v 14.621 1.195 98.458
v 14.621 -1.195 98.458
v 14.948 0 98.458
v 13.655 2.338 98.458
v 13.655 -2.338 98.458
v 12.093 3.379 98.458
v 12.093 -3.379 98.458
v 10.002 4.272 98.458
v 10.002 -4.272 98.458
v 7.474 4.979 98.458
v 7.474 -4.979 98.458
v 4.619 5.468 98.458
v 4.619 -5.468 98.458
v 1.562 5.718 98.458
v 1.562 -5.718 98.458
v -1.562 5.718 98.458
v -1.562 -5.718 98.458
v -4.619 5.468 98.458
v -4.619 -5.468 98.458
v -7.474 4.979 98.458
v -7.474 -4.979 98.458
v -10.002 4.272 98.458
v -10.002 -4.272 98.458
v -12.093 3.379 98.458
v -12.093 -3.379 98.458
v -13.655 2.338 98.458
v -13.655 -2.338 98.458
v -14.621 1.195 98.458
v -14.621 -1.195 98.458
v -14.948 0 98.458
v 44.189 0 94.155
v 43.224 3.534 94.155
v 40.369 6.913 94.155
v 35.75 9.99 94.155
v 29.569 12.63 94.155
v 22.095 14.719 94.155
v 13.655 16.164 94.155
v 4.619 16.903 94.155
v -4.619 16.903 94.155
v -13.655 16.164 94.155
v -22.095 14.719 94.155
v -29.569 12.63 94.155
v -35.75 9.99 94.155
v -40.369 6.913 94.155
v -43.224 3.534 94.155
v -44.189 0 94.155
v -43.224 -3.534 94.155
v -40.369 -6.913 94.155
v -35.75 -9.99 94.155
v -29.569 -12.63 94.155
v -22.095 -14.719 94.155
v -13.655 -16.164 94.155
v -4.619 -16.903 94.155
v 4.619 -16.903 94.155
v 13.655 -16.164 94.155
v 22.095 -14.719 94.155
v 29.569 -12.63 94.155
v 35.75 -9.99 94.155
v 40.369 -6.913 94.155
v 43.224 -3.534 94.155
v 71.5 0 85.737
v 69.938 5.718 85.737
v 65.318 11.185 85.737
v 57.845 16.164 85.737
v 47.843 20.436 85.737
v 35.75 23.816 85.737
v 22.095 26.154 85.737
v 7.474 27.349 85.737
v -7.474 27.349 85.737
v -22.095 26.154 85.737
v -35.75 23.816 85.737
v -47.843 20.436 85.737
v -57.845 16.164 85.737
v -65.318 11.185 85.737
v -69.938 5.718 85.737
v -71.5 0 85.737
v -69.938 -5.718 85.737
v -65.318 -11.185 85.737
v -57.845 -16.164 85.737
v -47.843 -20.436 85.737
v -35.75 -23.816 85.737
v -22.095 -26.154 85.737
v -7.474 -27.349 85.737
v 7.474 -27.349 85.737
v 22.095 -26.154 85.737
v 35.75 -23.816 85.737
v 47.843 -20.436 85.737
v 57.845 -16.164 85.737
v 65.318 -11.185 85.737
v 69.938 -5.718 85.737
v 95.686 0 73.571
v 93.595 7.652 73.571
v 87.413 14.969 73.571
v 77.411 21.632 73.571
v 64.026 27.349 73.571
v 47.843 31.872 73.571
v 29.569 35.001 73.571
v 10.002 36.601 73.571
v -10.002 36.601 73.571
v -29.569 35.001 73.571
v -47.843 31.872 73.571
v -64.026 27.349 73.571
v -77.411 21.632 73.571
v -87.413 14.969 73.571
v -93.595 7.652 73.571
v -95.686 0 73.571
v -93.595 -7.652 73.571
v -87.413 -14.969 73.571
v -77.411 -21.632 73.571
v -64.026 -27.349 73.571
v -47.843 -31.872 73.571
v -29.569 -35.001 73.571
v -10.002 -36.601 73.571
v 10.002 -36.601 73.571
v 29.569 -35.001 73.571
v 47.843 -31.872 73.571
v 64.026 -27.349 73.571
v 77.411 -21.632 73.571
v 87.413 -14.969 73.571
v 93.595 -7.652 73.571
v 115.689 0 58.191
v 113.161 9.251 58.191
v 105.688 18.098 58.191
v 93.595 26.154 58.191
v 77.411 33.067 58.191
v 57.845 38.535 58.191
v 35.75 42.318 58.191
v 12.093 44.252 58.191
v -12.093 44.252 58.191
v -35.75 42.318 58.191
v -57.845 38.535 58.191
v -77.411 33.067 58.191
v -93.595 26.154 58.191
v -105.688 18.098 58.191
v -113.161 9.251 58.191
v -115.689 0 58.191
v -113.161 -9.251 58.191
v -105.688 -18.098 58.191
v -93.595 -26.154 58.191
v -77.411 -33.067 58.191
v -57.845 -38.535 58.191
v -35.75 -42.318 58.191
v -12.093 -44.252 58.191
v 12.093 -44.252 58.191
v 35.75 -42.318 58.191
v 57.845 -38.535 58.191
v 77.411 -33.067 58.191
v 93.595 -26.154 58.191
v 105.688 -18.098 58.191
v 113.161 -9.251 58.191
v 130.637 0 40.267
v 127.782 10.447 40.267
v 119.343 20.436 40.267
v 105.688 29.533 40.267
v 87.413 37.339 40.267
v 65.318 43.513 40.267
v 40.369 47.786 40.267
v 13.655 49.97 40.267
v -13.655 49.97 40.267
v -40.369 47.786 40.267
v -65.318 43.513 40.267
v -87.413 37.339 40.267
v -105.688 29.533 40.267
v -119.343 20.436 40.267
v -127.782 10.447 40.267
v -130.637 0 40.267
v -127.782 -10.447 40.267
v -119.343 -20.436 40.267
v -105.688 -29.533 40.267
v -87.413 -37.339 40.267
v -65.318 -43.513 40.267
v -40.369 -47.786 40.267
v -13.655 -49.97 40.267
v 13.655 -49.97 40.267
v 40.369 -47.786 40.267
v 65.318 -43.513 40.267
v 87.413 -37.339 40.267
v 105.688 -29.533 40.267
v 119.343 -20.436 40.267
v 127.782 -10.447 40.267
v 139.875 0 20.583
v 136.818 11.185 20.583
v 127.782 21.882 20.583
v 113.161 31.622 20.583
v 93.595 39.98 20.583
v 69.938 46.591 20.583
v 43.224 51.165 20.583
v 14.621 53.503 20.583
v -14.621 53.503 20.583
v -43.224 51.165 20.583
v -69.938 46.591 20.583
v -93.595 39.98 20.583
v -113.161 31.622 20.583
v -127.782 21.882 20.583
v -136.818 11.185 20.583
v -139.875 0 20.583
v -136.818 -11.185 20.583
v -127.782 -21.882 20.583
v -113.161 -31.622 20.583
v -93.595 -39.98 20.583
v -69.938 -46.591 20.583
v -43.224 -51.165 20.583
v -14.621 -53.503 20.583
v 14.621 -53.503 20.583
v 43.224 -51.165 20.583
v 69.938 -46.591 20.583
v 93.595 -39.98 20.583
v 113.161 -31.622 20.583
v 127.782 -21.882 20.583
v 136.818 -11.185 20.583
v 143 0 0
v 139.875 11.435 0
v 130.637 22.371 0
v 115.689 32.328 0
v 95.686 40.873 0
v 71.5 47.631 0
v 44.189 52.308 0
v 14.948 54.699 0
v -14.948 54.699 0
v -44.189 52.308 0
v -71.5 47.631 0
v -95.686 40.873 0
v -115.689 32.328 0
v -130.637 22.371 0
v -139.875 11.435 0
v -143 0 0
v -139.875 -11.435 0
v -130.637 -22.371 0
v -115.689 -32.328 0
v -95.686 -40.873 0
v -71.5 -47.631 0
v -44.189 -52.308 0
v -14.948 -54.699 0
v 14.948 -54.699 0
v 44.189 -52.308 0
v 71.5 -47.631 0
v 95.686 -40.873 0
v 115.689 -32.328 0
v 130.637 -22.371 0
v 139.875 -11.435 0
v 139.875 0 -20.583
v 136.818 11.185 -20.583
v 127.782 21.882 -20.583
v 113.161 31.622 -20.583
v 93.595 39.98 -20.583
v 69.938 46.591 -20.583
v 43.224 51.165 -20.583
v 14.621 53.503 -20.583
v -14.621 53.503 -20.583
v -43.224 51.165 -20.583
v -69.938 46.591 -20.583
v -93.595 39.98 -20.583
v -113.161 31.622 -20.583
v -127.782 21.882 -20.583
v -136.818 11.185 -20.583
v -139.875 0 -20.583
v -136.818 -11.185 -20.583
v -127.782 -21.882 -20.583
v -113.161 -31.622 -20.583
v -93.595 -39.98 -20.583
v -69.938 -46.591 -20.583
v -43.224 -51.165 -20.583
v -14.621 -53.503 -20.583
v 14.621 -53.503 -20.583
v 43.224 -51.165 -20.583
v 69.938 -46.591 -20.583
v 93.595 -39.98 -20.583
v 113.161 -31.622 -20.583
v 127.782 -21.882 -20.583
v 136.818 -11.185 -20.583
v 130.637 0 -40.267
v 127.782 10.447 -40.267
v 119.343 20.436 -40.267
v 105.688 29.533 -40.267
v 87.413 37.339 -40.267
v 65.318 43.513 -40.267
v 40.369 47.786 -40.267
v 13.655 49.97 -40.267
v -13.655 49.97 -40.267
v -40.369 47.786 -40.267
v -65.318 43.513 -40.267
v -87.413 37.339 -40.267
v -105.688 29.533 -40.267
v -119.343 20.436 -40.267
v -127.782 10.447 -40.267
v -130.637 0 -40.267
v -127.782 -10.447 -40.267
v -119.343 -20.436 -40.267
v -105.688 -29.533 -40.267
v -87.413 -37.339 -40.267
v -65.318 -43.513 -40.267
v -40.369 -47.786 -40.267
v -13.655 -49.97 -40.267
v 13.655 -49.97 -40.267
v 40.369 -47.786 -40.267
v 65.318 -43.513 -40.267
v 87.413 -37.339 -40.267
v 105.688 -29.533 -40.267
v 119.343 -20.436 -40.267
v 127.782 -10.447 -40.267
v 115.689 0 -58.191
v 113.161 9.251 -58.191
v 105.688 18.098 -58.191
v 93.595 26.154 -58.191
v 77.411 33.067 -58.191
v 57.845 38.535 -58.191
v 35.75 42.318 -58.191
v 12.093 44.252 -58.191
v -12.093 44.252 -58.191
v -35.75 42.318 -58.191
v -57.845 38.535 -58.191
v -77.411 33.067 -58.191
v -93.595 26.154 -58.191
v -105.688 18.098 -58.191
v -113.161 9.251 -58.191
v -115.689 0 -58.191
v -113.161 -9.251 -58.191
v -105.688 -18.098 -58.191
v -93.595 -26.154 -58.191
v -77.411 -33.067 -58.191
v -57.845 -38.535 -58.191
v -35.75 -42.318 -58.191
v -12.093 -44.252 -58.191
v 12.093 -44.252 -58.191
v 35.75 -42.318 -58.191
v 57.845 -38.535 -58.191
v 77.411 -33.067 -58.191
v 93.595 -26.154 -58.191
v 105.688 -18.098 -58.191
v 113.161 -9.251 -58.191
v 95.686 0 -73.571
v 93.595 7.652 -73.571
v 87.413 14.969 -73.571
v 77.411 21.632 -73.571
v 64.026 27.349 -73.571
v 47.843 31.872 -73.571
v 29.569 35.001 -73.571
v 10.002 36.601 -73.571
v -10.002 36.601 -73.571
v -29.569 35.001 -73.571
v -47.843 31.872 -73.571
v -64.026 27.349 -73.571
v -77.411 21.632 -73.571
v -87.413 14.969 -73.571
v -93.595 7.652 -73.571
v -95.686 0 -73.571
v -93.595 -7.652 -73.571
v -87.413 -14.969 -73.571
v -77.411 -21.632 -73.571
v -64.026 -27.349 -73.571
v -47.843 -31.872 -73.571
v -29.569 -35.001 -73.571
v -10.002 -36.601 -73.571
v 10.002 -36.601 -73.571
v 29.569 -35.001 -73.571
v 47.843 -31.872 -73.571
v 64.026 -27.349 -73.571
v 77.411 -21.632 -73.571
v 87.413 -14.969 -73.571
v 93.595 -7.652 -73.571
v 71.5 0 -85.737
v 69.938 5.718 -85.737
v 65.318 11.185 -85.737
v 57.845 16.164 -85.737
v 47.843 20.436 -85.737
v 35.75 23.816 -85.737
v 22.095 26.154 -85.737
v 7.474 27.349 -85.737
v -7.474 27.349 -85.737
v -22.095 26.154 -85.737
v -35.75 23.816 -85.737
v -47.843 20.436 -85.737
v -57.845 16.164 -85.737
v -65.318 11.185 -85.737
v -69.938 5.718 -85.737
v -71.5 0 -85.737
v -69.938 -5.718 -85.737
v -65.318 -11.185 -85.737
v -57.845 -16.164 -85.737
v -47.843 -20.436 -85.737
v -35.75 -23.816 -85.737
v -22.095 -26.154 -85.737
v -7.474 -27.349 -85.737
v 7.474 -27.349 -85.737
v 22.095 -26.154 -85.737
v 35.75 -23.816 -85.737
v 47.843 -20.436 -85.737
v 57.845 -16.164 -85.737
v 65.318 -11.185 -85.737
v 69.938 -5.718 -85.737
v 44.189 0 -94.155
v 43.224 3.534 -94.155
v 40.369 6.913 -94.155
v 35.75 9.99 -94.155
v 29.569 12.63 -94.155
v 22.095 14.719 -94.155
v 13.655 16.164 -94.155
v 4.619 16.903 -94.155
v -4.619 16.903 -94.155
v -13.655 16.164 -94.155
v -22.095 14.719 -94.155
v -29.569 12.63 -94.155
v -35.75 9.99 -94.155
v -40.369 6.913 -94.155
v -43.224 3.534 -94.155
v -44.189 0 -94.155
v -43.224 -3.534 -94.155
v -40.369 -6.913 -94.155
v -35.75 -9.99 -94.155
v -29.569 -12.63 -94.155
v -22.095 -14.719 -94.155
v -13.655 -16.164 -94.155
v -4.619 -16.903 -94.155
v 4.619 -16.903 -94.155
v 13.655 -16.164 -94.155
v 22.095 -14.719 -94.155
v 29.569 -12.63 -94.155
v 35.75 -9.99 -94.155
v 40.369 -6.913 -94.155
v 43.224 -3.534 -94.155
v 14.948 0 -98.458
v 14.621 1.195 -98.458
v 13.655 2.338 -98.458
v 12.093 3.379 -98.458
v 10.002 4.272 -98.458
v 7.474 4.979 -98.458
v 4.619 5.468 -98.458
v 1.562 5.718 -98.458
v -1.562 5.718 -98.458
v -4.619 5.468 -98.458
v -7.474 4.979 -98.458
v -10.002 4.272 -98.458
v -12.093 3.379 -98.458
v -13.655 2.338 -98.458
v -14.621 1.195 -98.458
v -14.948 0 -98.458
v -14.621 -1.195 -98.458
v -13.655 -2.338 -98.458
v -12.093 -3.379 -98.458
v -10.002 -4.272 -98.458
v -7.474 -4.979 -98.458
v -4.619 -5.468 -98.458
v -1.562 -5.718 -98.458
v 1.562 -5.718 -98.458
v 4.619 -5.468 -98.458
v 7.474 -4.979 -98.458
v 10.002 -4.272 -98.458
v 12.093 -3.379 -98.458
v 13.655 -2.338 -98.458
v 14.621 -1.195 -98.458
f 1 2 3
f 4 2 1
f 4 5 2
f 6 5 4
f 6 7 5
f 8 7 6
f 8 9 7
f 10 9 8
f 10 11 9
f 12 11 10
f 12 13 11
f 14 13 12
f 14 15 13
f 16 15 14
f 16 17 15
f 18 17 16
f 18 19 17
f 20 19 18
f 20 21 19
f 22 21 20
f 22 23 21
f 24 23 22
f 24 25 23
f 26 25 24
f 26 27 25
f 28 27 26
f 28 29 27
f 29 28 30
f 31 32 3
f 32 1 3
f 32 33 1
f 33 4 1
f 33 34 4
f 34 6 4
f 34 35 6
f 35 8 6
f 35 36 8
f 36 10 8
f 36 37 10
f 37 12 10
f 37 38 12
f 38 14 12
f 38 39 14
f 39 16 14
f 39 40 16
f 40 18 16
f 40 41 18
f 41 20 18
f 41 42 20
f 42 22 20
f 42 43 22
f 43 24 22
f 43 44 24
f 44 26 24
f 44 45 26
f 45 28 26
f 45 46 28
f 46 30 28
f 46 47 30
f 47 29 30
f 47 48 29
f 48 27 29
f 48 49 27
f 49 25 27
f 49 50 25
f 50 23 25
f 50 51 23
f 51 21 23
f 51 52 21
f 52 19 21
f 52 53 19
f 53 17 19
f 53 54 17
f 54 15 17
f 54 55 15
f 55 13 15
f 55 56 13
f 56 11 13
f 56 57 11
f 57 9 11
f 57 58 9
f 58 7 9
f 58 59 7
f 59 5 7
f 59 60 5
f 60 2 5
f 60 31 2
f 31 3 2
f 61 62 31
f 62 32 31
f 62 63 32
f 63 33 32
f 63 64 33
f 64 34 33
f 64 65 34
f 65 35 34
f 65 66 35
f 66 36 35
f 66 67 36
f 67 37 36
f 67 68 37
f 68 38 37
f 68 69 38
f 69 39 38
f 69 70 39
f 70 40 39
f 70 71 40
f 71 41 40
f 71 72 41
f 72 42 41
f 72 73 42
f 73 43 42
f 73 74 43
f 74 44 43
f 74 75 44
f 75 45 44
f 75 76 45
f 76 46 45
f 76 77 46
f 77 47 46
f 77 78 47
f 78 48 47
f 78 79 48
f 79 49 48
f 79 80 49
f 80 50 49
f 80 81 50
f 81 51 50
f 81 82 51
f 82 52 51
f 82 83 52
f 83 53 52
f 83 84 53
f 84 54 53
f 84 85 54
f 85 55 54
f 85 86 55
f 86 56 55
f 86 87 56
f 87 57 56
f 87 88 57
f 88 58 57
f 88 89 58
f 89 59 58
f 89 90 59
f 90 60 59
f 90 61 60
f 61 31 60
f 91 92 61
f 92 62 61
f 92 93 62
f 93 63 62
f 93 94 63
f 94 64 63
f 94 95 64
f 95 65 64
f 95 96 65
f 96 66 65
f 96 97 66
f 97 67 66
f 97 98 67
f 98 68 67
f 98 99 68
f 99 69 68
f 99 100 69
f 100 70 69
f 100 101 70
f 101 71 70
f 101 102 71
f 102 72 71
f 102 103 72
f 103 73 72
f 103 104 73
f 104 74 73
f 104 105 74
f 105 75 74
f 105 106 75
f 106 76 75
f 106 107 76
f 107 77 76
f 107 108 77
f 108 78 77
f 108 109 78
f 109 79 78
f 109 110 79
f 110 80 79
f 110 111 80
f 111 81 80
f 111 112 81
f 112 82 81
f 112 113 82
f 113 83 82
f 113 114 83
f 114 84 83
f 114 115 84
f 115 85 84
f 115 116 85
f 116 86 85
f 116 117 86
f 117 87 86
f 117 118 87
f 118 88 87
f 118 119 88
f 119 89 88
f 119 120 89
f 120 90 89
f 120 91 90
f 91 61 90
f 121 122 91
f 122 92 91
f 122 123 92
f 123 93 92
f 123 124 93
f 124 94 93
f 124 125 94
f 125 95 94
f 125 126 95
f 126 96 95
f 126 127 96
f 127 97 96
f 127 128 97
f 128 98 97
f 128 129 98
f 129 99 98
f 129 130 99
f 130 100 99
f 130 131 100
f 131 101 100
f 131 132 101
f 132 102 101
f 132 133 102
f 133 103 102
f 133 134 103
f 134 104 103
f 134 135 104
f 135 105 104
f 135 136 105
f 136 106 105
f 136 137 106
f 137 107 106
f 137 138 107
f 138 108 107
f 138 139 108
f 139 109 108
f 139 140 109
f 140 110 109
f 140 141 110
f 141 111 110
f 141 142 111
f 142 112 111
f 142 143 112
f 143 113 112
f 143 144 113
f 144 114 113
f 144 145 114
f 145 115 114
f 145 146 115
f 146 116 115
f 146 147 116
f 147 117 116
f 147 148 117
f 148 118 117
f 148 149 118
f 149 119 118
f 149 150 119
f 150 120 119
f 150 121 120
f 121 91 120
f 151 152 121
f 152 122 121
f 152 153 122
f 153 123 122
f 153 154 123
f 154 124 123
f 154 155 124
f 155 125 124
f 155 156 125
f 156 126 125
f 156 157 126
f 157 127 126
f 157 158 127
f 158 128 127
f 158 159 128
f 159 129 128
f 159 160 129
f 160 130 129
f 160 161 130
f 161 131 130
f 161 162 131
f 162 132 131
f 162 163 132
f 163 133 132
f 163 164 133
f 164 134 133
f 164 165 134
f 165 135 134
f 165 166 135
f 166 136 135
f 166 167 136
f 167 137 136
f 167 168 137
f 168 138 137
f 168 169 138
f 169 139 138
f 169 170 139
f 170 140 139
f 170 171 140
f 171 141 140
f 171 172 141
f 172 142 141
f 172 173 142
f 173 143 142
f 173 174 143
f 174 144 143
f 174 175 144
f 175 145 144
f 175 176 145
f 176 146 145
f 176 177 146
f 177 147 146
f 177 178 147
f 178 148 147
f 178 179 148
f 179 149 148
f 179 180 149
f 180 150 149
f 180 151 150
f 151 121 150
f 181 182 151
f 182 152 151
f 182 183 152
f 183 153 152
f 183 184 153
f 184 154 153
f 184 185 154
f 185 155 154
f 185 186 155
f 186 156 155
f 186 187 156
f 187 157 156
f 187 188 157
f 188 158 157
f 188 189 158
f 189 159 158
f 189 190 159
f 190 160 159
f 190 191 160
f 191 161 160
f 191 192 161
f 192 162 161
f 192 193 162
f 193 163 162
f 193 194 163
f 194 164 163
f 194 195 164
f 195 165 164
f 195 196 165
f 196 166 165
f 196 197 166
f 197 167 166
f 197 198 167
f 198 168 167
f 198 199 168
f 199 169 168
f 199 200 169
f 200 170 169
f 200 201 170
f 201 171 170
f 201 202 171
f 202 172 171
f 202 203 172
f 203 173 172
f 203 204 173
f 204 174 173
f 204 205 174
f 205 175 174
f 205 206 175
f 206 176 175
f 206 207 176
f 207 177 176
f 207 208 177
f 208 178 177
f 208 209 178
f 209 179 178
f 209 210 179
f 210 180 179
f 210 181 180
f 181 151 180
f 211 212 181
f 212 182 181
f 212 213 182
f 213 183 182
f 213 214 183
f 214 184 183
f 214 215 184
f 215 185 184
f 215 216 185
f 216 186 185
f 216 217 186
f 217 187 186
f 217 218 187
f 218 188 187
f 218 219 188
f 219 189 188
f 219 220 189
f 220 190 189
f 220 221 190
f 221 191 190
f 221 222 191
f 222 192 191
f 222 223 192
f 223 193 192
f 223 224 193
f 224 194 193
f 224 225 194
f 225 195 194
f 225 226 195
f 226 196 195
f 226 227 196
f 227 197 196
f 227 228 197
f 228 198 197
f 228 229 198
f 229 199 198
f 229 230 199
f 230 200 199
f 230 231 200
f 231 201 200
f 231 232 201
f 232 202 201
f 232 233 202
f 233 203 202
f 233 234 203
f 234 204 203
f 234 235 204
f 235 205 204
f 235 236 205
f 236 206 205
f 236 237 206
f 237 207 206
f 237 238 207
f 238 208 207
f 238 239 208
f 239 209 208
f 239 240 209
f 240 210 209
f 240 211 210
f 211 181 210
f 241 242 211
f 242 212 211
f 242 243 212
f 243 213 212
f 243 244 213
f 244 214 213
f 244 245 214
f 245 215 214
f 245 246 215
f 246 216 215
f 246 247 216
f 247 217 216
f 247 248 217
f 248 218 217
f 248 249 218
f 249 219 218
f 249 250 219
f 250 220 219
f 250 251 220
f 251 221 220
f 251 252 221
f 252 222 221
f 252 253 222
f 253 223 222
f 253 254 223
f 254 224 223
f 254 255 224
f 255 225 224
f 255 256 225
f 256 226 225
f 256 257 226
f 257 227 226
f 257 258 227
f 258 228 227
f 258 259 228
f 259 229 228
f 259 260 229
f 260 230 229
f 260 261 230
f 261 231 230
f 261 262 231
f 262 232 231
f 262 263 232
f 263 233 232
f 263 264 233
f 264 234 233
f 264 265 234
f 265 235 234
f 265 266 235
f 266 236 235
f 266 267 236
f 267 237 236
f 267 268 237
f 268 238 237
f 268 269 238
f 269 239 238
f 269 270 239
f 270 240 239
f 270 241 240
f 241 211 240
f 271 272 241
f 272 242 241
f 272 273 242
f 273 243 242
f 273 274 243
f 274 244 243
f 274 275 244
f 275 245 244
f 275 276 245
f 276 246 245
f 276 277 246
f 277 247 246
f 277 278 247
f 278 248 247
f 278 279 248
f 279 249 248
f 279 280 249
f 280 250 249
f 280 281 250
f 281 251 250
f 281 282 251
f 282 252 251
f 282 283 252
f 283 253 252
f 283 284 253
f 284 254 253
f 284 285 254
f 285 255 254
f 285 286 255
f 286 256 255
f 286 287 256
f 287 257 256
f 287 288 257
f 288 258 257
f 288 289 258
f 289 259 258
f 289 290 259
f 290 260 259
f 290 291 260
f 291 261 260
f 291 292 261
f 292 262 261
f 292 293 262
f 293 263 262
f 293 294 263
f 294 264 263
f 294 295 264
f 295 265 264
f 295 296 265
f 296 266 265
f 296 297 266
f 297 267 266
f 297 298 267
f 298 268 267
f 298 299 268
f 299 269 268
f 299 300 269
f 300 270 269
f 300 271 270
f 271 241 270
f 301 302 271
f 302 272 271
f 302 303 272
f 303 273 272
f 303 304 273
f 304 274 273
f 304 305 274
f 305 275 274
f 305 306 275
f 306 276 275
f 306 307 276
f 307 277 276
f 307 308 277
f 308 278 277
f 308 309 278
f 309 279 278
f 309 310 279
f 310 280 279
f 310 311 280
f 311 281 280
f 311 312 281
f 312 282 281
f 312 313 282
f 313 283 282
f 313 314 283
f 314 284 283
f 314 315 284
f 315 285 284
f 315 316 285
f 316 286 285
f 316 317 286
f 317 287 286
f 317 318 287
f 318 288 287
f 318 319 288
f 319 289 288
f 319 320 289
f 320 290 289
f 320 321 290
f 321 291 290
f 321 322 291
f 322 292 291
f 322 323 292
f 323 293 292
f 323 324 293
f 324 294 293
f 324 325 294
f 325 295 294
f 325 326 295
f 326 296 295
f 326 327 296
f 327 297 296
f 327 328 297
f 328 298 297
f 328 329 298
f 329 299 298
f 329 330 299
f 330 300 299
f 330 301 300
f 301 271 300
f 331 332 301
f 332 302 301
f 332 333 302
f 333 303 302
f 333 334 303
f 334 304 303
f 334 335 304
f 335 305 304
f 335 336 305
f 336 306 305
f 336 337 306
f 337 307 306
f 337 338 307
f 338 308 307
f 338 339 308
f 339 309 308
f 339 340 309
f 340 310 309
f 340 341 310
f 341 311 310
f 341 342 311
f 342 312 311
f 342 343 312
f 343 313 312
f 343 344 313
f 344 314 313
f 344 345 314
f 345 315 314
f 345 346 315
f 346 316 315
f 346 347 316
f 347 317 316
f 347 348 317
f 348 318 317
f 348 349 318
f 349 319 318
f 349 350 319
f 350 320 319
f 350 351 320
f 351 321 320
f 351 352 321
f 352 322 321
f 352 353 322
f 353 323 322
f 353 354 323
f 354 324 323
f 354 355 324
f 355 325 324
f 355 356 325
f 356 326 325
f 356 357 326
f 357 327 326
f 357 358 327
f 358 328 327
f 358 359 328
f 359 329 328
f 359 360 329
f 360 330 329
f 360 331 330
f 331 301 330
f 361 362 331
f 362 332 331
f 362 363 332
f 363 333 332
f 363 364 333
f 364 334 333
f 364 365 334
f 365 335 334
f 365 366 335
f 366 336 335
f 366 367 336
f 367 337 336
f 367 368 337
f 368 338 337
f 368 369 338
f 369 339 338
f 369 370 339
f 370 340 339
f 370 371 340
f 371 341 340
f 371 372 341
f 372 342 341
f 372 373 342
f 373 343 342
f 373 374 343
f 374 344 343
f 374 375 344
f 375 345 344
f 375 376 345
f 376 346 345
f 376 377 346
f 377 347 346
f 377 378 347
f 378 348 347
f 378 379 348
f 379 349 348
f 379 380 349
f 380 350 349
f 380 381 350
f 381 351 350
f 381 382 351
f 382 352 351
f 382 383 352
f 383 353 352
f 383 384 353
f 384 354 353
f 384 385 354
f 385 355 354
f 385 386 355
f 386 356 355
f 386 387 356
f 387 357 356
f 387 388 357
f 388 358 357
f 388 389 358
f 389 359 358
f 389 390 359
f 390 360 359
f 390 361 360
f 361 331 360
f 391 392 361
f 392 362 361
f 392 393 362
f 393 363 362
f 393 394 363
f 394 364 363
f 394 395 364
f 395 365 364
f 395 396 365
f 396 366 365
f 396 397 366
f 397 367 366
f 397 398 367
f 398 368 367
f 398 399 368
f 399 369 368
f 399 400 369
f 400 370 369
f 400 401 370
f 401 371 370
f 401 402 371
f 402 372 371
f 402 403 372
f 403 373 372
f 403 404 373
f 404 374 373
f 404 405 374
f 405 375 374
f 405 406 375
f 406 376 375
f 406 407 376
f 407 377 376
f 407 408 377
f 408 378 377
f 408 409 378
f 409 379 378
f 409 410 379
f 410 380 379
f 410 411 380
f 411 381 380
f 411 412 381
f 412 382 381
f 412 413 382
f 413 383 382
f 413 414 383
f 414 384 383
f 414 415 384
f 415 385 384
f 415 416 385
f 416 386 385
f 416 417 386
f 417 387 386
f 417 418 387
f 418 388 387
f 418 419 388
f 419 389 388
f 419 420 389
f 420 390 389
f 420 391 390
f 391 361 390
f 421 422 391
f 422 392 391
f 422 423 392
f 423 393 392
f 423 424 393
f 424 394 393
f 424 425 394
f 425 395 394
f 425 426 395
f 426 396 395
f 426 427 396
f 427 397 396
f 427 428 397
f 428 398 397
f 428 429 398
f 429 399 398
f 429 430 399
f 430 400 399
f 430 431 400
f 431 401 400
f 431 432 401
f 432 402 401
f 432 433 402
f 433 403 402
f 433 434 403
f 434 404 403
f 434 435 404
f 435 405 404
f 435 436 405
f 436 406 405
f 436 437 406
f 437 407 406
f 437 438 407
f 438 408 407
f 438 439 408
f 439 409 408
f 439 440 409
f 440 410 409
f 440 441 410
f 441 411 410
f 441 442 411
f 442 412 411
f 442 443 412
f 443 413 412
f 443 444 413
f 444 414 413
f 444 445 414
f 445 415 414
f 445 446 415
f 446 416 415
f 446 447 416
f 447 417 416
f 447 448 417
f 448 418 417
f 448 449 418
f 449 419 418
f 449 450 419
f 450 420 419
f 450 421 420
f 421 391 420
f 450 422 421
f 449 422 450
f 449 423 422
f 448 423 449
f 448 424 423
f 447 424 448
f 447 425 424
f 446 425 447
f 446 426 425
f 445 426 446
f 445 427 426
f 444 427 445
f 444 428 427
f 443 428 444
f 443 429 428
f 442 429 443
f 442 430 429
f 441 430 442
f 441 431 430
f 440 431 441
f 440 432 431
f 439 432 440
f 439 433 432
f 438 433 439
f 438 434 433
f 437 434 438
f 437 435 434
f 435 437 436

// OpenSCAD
// Generated by SolidPython 1.0.1 on 2020-07-29 00:46:50


scale(v = [13, 5, 9]) {
	sphere(r = 11);
}
/***********************************************
*********      SolidPython code:      **********
************************************************
 
# import packages: SolidPython
from solid import *
from solid.utils import *
from itertools import chain, combinations, permutations


class Resize:

    def __init__(self, scad_file):
        self.scad_file = scad_file
        #self.scad_file = import_scad(scad_file)
        # cone/cylinder param:
        self.r1 = 0
        self.r2 = 0
        self.h = 0
        # rectangular prism param:
        self.w = 0
        self.l = 0
        # ellipse param:
        self.r = 0

    # import OpenScad code (file name corresponds to shape)


    # classify shape + parameters
    def assign(self, param1, param2, param3):
        if self.scad_file == 'cone.scad':
            self.r1 = param1
            self.r2 = param2
            self.h = param3
        elif self.scad_file == 'cylinder.scad':
            self.r1 = param1
            self.r2 = param2
            self.h = param3
        elif self.scad_file == 'rectangularPrism.scad':
            self.h = param1
            self.l = param2
            self.w = param3
        else:
            self.r = param1
            self.h = param2

    # resize parameters
    def iterate(self):
        x = range(3, 20, 2)
        i = 1
        if self.scad_file == 'cone.scad':
            tempList = list(permutations(x, 2))
            for temp in tempList:
                param1 = temp[0]
                param2 = temp[1]
                filepath = 'produced_scad_files/' + 'cone' + str(param1) + '_' + str(param2) + '_' + '.scad'
                scad_render_to_file(cylinder(h=param1, r1=param2, r2=0), filepath)

        elif self.scad_file == 'cylinder.scad':
            tempList = list(permutations(x, 3))
            for temp in tempList:
                param1 = temp[0]
                param2 = temp[1]
                filepath = 'produced_scad_files/' + 'cylinder' + str(param1) + '_' + str(param2) + '_' + '.scad'
                scad_render_to_file(cylinder(h=param1, r1=param2, r2=param2), filepath)

        elif self.scad_file == 'rectangularPrism.scad':
            tempList = list(permutations(x, 3))
            for temp in tempList:
                param1 = temp[0]
                param2 = temp[1]
                param3 = temp[2]
                filepath = 'produced_scad_files/' + 'rectangularPrism' + str(param1) + '_' + str(param2) + '_' + str(
                    param3) + '.scad'
                scad_render_to_file(cube(size=(param1, param2, param3)), filepath)

        elif self.scad_file == 'ellipse.scad':
            tempList = list(permutations(x, 4))
            for temp in tempList:
                param1 = temp[0]
                param2 = temp[1]
                param3 = temp[2]
                param4 = temp[3]
                filepath = 'produced_scad_files/' + 'ellipse' + str(param1) + '_' + str(param2) + '_' + str(param3) + '_' + str(param4) + '.scad'
                scad_render_to_file(scale([param1, param2, param3])(sphere(r=param4)), filepath)

    def render_to_scadfile(self):
        scad_render_to_file(scad, 'example.scad') 
 
************************************************/
